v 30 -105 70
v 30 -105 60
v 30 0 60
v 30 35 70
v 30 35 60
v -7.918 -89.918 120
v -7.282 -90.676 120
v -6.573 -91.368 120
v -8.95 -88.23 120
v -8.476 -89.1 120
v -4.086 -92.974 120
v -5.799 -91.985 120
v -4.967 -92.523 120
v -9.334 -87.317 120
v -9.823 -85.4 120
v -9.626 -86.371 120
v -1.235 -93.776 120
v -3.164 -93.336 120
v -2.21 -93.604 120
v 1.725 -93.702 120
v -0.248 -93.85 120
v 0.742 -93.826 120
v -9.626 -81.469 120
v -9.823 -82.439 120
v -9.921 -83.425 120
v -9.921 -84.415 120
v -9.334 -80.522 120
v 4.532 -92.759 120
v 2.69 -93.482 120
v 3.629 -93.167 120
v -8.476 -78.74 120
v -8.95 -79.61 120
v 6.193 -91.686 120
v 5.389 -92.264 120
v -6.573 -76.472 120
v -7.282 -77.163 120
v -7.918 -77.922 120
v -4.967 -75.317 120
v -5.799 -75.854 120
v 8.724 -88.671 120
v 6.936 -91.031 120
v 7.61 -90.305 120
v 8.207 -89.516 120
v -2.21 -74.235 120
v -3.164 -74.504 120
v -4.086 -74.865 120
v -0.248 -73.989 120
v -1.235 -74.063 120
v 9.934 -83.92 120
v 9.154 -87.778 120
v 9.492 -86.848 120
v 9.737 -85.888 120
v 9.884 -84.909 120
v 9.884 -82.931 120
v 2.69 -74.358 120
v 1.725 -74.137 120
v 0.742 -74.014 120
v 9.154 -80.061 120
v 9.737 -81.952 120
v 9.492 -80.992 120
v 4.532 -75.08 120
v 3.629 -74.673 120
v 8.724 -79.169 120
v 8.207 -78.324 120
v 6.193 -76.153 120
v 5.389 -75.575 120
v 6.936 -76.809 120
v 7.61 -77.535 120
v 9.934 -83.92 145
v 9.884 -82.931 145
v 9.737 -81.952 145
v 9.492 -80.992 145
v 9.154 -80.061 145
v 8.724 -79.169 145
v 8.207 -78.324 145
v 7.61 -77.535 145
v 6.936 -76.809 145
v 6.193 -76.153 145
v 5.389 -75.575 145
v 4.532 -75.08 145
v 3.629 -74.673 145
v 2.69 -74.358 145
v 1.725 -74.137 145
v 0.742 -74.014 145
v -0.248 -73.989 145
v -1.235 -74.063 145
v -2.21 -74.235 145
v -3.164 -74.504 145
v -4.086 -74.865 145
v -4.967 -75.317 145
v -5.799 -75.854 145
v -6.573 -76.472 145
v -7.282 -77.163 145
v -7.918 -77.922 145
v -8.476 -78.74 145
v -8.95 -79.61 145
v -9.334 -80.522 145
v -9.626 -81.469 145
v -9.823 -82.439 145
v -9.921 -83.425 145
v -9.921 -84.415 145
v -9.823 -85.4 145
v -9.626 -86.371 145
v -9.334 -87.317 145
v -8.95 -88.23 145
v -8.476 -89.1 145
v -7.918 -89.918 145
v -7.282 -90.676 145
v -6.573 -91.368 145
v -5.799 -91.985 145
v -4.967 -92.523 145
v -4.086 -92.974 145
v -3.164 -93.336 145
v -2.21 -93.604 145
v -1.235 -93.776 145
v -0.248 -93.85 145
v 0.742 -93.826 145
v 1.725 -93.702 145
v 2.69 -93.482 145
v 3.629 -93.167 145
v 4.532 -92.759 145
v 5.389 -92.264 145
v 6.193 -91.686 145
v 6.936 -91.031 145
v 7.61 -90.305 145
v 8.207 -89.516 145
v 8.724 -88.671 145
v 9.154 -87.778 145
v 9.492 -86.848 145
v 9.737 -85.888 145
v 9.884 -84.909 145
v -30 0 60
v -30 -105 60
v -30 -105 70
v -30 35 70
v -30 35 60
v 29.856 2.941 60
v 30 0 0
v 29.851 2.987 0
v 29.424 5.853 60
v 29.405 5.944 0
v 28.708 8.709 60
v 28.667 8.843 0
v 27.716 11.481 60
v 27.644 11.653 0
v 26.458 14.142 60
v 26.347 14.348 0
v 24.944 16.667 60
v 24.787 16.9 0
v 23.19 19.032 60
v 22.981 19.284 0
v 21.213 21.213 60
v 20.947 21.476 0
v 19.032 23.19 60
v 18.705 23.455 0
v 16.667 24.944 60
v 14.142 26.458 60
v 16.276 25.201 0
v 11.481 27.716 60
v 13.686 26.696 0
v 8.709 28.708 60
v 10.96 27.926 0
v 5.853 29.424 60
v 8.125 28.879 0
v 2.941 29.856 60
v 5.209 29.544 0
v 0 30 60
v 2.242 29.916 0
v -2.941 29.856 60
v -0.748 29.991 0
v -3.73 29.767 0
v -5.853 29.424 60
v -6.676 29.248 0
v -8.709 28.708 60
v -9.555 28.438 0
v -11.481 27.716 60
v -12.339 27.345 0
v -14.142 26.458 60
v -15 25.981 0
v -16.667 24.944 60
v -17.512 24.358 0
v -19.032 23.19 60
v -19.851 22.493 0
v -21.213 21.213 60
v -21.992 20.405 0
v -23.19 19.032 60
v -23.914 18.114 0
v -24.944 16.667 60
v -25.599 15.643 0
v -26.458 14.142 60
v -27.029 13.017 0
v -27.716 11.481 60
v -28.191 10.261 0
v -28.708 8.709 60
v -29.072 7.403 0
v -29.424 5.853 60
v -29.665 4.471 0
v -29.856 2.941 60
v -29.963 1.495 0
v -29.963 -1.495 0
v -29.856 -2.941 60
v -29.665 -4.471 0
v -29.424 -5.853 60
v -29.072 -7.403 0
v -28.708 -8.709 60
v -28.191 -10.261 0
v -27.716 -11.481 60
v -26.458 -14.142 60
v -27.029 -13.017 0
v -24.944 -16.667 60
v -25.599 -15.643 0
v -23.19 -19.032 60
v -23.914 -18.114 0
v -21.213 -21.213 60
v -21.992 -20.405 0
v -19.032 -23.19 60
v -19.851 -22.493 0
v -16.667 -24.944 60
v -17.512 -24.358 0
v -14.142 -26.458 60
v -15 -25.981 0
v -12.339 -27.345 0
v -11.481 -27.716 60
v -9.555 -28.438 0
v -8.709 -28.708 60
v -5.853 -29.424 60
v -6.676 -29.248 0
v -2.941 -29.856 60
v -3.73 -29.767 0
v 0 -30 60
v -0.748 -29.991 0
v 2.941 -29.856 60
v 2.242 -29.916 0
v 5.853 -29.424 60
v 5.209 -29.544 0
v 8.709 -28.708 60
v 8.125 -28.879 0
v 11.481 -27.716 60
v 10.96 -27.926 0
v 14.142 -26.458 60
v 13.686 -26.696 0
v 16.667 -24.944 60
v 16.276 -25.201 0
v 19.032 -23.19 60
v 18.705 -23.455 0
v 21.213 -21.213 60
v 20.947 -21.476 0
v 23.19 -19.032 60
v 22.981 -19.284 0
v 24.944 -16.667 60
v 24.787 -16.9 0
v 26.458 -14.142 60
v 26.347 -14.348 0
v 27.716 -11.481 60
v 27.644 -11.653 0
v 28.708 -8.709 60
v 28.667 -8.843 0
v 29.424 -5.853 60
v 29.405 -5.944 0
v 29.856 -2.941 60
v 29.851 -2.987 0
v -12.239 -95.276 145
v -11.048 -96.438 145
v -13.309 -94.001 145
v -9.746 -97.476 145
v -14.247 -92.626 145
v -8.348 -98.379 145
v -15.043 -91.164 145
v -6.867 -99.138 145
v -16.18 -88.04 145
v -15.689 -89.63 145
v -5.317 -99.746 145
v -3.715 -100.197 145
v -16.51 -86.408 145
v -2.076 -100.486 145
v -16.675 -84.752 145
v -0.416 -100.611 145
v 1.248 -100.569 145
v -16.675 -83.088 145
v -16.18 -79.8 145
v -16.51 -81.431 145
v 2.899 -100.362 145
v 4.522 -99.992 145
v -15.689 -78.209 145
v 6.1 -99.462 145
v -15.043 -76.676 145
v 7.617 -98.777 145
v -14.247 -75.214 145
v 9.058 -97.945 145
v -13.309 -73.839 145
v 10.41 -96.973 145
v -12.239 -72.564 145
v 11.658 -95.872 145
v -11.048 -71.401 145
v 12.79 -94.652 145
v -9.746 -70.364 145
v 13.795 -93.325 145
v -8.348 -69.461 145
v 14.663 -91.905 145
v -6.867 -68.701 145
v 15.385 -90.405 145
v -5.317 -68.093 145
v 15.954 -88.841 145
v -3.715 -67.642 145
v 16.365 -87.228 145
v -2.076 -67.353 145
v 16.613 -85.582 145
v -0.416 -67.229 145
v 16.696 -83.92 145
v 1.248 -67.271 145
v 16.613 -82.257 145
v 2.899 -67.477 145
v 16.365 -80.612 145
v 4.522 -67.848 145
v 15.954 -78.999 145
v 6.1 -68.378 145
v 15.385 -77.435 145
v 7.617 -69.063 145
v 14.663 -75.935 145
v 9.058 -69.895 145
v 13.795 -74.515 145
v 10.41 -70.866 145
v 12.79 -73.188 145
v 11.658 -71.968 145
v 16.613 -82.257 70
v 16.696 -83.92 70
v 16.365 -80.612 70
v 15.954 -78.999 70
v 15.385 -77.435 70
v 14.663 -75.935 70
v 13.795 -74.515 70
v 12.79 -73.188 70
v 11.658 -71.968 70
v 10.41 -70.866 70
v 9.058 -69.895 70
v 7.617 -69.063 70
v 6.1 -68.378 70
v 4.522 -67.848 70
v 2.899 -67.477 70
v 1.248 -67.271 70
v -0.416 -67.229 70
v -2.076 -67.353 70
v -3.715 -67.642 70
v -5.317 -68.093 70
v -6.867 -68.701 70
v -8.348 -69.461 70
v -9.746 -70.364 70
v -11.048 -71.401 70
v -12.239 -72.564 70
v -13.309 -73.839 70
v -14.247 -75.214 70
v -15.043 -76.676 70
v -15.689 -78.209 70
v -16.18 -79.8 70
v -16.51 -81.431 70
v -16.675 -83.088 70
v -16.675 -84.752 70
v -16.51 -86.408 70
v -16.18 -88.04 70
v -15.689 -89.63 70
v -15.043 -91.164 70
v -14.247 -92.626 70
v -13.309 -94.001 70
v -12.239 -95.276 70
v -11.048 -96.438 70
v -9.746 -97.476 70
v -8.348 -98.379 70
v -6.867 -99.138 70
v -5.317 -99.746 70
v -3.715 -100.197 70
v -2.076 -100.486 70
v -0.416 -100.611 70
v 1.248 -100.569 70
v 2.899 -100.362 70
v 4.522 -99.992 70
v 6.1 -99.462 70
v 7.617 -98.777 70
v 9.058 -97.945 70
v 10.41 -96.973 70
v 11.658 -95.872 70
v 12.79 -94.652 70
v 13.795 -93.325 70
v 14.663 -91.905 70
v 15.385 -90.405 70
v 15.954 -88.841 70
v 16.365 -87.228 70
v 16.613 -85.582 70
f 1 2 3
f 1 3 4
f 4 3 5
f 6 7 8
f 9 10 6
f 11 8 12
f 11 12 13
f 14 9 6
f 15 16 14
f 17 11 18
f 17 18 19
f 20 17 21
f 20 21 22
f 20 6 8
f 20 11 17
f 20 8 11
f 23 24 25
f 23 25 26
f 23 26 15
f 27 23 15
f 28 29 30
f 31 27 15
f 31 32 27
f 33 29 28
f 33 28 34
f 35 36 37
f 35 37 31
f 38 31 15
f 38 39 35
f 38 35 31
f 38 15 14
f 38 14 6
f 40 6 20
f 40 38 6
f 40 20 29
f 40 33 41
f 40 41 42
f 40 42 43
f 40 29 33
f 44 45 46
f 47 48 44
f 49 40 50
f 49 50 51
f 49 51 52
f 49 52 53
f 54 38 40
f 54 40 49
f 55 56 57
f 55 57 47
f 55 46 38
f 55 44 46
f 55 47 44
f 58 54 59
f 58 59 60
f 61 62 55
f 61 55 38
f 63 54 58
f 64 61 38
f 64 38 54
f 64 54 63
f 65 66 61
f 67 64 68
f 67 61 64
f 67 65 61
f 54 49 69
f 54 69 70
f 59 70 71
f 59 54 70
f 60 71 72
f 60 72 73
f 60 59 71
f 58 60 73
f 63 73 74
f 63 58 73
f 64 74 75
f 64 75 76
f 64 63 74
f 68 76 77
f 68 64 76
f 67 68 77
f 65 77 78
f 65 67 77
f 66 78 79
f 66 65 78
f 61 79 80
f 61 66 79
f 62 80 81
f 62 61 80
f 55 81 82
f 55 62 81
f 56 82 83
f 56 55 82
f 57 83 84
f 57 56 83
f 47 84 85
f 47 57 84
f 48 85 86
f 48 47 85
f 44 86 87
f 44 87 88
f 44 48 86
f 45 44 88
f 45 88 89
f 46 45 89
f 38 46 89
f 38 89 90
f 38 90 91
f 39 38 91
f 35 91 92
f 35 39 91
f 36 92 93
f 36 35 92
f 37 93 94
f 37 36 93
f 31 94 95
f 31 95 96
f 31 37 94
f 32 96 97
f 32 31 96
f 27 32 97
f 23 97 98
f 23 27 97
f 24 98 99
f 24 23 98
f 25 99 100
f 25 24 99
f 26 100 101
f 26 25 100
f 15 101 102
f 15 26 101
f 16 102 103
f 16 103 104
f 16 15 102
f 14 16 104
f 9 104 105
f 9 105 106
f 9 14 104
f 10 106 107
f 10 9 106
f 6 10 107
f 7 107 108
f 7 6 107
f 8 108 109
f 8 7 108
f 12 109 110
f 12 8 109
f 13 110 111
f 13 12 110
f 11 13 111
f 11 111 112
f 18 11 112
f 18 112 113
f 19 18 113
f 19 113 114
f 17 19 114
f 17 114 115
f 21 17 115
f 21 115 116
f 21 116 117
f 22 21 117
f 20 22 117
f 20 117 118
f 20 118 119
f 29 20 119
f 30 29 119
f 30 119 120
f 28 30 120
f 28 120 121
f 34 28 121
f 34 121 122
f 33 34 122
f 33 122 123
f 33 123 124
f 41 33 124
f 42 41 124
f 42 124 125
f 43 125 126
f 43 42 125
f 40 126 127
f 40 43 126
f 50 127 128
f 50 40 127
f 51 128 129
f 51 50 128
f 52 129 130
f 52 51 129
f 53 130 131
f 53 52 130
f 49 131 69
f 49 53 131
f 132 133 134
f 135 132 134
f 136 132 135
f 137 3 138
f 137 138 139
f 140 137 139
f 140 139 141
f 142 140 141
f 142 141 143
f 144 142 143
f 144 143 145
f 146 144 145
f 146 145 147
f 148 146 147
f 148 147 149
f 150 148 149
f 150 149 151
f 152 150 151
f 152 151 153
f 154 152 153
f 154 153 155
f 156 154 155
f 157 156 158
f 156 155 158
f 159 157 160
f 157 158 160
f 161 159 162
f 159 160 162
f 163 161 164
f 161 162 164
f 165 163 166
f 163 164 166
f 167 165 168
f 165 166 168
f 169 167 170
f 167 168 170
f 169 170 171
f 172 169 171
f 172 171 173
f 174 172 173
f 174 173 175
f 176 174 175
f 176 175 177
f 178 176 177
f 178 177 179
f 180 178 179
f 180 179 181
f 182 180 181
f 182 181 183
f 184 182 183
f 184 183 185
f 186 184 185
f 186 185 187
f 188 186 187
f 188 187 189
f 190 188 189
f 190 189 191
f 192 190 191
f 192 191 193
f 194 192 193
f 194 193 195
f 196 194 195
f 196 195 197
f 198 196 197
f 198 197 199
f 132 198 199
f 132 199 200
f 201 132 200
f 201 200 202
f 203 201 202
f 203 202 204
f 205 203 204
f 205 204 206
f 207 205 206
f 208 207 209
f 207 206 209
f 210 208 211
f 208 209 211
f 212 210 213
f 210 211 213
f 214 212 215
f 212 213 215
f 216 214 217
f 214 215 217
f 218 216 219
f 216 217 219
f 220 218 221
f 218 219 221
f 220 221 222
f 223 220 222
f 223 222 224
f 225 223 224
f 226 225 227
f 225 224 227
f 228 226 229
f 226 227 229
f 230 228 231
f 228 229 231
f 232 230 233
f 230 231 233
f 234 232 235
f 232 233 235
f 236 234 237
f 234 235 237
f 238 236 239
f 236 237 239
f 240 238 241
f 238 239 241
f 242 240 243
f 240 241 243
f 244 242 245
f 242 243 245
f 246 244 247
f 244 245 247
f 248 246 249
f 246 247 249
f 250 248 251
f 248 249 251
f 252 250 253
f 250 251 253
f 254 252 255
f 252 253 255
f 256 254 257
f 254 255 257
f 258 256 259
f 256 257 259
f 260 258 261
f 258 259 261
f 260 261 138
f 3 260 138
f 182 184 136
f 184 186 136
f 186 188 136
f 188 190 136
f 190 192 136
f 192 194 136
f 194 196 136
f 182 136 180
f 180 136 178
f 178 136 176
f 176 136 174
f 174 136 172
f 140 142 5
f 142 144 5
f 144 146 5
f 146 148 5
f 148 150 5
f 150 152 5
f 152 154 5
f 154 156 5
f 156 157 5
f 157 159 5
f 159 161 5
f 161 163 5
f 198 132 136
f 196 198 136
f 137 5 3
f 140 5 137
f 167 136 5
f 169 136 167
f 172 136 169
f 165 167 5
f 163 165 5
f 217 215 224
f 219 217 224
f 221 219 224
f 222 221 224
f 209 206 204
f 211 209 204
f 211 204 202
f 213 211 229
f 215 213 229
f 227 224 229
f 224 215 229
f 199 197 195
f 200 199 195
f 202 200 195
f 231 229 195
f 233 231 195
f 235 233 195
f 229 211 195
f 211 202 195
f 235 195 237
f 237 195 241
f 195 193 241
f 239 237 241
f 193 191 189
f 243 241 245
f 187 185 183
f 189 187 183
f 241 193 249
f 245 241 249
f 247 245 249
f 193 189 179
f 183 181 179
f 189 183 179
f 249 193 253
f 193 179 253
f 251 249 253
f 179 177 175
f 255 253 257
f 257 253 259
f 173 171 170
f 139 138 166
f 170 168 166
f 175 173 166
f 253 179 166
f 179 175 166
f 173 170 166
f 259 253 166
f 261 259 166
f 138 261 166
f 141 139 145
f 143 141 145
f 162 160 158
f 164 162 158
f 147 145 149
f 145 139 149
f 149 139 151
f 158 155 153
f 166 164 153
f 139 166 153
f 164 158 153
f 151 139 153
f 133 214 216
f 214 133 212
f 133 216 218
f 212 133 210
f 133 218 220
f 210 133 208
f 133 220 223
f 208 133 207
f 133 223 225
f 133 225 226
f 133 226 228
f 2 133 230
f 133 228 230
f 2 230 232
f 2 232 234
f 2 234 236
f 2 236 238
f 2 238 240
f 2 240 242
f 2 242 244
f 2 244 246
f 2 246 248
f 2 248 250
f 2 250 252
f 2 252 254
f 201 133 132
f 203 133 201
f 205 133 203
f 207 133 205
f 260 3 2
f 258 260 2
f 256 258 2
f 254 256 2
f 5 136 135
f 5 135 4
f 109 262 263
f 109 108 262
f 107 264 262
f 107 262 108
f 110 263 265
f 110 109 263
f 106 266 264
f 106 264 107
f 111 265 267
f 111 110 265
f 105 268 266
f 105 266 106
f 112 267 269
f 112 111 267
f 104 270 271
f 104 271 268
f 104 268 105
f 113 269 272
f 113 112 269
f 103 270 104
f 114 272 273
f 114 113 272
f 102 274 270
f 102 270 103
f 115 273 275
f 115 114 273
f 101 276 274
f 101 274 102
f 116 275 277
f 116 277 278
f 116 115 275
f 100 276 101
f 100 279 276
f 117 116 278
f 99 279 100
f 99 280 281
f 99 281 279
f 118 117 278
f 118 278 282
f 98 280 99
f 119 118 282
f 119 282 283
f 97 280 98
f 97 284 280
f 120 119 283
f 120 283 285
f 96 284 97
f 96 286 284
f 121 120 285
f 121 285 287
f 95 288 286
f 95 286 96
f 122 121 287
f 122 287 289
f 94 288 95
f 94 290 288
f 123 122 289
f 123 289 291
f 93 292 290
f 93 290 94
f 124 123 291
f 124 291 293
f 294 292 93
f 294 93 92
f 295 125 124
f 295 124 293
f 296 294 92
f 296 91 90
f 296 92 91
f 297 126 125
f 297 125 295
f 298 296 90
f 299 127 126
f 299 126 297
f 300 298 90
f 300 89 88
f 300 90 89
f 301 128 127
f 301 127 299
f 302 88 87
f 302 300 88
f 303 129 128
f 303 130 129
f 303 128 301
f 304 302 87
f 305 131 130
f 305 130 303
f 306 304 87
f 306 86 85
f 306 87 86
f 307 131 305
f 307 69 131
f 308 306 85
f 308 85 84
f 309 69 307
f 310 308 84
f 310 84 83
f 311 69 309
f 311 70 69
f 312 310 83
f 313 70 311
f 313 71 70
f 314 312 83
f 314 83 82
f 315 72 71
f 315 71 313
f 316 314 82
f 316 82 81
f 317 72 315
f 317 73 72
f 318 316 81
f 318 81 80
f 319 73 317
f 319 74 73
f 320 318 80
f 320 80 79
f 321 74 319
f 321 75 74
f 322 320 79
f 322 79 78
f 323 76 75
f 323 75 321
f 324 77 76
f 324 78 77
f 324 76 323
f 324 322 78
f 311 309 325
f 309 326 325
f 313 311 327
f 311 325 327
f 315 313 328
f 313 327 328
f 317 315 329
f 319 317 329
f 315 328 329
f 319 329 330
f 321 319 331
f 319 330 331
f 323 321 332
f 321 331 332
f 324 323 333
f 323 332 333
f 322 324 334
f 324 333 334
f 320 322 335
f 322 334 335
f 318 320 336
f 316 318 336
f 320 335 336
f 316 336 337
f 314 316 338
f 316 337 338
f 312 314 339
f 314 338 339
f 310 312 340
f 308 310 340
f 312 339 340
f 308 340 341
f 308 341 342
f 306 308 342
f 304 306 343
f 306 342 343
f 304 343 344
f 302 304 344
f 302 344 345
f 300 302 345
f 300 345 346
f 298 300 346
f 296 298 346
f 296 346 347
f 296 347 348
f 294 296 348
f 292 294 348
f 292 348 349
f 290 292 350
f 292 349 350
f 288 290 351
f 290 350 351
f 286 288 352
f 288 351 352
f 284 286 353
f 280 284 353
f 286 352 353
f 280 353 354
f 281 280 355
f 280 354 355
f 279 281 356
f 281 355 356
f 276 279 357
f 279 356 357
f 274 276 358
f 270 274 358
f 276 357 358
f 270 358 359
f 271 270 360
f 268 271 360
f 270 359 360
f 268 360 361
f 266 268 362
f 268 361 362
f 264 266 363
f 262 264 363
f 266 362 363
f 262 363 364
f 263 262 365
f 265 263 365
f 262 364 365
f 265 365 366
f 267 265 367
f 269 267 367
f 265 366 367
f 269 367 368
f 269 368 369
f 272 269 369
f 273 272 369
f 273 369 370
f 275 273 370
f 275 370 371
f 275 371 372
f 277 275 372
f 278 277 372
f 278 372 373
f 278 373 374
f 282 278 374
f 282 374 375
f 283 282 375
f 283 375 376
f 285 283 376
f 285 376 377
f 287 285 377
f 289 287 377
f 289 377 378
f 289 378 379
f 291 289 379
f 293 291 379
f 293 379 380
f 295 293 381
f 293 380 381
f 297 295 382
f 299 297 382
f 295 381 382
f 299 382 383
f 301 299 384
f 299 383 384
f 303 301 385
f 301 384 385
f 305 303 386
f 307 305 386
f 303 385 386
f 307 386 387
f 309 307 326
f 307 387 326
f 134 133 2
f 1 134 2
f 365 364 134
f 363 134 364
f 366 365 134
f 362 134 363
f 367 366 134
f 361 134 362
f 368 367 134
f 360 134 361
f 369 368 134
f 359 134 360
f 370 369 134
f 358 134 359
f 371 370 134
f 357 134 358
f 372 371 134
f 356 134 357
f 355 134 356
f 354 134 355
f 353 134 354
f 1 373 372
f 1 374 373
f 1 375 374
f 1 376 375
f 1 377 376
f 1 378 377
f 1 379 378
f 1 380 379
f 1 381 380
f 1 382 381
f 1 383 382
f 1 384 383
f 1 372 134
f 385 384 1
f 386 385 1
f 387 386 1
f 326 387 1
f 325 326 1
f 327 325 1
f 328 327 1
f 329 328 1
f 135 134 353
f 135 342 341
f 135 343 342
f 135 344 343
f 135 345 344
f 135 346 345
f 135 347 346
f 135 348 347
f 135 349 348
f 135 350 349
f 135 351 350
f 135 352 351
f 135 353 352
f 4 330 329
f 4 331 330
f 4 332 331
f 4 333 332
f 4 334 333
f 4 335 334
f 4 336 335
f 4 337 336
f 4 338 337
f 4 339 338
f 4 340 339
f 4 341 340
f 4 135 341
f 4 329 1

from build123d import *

# Parameters (mm, degrees)
F0_R     = 30
F1_DEPTH = 60
F2_W     = 60
F2_H     = 140
F3_DEPTH = 10
F4_R     = 16.695994
F5_DEPTH = 50
F6_R     = 16.695994
F6_R_2   = 9.933537
F7_DEPTH = 25


with BuildPart() as f1:
    # F0 (on Top) → F1 (new body)
    with BuildSketch(Plane.XY):
        Circle(F0_R)
    extrude(amount=F1_DEPTH)

    # F2 (on face) → F3 (join)
    with BuildSketch(Plane.XY.offset(60)):
        with Locations((0, -35)):
            Rectangle(F2_W, F2_H)
    extrude(amount=F3_DEPTH)

    # F4 (on face) → F5 (join)
    with BuildSketch(Plane.XY.offset(70)):
        with Locations((0, -83.919823)):
            Circle(F4_R)
    extrude(amount=F5_DEPTH)

    # F6 (on face) → F7 (join)
    with BuildSketch(Plane.XY.offset(120)):
        with Locations((0, -83.919823)):
            Circle(F6_R)
        with Locations((0, -83.919823)):
            Circle(F6_R_2, mode=Mode.SUBTRACT)
    extrude(amount=F7_DEPTH)


solid = f1.part
